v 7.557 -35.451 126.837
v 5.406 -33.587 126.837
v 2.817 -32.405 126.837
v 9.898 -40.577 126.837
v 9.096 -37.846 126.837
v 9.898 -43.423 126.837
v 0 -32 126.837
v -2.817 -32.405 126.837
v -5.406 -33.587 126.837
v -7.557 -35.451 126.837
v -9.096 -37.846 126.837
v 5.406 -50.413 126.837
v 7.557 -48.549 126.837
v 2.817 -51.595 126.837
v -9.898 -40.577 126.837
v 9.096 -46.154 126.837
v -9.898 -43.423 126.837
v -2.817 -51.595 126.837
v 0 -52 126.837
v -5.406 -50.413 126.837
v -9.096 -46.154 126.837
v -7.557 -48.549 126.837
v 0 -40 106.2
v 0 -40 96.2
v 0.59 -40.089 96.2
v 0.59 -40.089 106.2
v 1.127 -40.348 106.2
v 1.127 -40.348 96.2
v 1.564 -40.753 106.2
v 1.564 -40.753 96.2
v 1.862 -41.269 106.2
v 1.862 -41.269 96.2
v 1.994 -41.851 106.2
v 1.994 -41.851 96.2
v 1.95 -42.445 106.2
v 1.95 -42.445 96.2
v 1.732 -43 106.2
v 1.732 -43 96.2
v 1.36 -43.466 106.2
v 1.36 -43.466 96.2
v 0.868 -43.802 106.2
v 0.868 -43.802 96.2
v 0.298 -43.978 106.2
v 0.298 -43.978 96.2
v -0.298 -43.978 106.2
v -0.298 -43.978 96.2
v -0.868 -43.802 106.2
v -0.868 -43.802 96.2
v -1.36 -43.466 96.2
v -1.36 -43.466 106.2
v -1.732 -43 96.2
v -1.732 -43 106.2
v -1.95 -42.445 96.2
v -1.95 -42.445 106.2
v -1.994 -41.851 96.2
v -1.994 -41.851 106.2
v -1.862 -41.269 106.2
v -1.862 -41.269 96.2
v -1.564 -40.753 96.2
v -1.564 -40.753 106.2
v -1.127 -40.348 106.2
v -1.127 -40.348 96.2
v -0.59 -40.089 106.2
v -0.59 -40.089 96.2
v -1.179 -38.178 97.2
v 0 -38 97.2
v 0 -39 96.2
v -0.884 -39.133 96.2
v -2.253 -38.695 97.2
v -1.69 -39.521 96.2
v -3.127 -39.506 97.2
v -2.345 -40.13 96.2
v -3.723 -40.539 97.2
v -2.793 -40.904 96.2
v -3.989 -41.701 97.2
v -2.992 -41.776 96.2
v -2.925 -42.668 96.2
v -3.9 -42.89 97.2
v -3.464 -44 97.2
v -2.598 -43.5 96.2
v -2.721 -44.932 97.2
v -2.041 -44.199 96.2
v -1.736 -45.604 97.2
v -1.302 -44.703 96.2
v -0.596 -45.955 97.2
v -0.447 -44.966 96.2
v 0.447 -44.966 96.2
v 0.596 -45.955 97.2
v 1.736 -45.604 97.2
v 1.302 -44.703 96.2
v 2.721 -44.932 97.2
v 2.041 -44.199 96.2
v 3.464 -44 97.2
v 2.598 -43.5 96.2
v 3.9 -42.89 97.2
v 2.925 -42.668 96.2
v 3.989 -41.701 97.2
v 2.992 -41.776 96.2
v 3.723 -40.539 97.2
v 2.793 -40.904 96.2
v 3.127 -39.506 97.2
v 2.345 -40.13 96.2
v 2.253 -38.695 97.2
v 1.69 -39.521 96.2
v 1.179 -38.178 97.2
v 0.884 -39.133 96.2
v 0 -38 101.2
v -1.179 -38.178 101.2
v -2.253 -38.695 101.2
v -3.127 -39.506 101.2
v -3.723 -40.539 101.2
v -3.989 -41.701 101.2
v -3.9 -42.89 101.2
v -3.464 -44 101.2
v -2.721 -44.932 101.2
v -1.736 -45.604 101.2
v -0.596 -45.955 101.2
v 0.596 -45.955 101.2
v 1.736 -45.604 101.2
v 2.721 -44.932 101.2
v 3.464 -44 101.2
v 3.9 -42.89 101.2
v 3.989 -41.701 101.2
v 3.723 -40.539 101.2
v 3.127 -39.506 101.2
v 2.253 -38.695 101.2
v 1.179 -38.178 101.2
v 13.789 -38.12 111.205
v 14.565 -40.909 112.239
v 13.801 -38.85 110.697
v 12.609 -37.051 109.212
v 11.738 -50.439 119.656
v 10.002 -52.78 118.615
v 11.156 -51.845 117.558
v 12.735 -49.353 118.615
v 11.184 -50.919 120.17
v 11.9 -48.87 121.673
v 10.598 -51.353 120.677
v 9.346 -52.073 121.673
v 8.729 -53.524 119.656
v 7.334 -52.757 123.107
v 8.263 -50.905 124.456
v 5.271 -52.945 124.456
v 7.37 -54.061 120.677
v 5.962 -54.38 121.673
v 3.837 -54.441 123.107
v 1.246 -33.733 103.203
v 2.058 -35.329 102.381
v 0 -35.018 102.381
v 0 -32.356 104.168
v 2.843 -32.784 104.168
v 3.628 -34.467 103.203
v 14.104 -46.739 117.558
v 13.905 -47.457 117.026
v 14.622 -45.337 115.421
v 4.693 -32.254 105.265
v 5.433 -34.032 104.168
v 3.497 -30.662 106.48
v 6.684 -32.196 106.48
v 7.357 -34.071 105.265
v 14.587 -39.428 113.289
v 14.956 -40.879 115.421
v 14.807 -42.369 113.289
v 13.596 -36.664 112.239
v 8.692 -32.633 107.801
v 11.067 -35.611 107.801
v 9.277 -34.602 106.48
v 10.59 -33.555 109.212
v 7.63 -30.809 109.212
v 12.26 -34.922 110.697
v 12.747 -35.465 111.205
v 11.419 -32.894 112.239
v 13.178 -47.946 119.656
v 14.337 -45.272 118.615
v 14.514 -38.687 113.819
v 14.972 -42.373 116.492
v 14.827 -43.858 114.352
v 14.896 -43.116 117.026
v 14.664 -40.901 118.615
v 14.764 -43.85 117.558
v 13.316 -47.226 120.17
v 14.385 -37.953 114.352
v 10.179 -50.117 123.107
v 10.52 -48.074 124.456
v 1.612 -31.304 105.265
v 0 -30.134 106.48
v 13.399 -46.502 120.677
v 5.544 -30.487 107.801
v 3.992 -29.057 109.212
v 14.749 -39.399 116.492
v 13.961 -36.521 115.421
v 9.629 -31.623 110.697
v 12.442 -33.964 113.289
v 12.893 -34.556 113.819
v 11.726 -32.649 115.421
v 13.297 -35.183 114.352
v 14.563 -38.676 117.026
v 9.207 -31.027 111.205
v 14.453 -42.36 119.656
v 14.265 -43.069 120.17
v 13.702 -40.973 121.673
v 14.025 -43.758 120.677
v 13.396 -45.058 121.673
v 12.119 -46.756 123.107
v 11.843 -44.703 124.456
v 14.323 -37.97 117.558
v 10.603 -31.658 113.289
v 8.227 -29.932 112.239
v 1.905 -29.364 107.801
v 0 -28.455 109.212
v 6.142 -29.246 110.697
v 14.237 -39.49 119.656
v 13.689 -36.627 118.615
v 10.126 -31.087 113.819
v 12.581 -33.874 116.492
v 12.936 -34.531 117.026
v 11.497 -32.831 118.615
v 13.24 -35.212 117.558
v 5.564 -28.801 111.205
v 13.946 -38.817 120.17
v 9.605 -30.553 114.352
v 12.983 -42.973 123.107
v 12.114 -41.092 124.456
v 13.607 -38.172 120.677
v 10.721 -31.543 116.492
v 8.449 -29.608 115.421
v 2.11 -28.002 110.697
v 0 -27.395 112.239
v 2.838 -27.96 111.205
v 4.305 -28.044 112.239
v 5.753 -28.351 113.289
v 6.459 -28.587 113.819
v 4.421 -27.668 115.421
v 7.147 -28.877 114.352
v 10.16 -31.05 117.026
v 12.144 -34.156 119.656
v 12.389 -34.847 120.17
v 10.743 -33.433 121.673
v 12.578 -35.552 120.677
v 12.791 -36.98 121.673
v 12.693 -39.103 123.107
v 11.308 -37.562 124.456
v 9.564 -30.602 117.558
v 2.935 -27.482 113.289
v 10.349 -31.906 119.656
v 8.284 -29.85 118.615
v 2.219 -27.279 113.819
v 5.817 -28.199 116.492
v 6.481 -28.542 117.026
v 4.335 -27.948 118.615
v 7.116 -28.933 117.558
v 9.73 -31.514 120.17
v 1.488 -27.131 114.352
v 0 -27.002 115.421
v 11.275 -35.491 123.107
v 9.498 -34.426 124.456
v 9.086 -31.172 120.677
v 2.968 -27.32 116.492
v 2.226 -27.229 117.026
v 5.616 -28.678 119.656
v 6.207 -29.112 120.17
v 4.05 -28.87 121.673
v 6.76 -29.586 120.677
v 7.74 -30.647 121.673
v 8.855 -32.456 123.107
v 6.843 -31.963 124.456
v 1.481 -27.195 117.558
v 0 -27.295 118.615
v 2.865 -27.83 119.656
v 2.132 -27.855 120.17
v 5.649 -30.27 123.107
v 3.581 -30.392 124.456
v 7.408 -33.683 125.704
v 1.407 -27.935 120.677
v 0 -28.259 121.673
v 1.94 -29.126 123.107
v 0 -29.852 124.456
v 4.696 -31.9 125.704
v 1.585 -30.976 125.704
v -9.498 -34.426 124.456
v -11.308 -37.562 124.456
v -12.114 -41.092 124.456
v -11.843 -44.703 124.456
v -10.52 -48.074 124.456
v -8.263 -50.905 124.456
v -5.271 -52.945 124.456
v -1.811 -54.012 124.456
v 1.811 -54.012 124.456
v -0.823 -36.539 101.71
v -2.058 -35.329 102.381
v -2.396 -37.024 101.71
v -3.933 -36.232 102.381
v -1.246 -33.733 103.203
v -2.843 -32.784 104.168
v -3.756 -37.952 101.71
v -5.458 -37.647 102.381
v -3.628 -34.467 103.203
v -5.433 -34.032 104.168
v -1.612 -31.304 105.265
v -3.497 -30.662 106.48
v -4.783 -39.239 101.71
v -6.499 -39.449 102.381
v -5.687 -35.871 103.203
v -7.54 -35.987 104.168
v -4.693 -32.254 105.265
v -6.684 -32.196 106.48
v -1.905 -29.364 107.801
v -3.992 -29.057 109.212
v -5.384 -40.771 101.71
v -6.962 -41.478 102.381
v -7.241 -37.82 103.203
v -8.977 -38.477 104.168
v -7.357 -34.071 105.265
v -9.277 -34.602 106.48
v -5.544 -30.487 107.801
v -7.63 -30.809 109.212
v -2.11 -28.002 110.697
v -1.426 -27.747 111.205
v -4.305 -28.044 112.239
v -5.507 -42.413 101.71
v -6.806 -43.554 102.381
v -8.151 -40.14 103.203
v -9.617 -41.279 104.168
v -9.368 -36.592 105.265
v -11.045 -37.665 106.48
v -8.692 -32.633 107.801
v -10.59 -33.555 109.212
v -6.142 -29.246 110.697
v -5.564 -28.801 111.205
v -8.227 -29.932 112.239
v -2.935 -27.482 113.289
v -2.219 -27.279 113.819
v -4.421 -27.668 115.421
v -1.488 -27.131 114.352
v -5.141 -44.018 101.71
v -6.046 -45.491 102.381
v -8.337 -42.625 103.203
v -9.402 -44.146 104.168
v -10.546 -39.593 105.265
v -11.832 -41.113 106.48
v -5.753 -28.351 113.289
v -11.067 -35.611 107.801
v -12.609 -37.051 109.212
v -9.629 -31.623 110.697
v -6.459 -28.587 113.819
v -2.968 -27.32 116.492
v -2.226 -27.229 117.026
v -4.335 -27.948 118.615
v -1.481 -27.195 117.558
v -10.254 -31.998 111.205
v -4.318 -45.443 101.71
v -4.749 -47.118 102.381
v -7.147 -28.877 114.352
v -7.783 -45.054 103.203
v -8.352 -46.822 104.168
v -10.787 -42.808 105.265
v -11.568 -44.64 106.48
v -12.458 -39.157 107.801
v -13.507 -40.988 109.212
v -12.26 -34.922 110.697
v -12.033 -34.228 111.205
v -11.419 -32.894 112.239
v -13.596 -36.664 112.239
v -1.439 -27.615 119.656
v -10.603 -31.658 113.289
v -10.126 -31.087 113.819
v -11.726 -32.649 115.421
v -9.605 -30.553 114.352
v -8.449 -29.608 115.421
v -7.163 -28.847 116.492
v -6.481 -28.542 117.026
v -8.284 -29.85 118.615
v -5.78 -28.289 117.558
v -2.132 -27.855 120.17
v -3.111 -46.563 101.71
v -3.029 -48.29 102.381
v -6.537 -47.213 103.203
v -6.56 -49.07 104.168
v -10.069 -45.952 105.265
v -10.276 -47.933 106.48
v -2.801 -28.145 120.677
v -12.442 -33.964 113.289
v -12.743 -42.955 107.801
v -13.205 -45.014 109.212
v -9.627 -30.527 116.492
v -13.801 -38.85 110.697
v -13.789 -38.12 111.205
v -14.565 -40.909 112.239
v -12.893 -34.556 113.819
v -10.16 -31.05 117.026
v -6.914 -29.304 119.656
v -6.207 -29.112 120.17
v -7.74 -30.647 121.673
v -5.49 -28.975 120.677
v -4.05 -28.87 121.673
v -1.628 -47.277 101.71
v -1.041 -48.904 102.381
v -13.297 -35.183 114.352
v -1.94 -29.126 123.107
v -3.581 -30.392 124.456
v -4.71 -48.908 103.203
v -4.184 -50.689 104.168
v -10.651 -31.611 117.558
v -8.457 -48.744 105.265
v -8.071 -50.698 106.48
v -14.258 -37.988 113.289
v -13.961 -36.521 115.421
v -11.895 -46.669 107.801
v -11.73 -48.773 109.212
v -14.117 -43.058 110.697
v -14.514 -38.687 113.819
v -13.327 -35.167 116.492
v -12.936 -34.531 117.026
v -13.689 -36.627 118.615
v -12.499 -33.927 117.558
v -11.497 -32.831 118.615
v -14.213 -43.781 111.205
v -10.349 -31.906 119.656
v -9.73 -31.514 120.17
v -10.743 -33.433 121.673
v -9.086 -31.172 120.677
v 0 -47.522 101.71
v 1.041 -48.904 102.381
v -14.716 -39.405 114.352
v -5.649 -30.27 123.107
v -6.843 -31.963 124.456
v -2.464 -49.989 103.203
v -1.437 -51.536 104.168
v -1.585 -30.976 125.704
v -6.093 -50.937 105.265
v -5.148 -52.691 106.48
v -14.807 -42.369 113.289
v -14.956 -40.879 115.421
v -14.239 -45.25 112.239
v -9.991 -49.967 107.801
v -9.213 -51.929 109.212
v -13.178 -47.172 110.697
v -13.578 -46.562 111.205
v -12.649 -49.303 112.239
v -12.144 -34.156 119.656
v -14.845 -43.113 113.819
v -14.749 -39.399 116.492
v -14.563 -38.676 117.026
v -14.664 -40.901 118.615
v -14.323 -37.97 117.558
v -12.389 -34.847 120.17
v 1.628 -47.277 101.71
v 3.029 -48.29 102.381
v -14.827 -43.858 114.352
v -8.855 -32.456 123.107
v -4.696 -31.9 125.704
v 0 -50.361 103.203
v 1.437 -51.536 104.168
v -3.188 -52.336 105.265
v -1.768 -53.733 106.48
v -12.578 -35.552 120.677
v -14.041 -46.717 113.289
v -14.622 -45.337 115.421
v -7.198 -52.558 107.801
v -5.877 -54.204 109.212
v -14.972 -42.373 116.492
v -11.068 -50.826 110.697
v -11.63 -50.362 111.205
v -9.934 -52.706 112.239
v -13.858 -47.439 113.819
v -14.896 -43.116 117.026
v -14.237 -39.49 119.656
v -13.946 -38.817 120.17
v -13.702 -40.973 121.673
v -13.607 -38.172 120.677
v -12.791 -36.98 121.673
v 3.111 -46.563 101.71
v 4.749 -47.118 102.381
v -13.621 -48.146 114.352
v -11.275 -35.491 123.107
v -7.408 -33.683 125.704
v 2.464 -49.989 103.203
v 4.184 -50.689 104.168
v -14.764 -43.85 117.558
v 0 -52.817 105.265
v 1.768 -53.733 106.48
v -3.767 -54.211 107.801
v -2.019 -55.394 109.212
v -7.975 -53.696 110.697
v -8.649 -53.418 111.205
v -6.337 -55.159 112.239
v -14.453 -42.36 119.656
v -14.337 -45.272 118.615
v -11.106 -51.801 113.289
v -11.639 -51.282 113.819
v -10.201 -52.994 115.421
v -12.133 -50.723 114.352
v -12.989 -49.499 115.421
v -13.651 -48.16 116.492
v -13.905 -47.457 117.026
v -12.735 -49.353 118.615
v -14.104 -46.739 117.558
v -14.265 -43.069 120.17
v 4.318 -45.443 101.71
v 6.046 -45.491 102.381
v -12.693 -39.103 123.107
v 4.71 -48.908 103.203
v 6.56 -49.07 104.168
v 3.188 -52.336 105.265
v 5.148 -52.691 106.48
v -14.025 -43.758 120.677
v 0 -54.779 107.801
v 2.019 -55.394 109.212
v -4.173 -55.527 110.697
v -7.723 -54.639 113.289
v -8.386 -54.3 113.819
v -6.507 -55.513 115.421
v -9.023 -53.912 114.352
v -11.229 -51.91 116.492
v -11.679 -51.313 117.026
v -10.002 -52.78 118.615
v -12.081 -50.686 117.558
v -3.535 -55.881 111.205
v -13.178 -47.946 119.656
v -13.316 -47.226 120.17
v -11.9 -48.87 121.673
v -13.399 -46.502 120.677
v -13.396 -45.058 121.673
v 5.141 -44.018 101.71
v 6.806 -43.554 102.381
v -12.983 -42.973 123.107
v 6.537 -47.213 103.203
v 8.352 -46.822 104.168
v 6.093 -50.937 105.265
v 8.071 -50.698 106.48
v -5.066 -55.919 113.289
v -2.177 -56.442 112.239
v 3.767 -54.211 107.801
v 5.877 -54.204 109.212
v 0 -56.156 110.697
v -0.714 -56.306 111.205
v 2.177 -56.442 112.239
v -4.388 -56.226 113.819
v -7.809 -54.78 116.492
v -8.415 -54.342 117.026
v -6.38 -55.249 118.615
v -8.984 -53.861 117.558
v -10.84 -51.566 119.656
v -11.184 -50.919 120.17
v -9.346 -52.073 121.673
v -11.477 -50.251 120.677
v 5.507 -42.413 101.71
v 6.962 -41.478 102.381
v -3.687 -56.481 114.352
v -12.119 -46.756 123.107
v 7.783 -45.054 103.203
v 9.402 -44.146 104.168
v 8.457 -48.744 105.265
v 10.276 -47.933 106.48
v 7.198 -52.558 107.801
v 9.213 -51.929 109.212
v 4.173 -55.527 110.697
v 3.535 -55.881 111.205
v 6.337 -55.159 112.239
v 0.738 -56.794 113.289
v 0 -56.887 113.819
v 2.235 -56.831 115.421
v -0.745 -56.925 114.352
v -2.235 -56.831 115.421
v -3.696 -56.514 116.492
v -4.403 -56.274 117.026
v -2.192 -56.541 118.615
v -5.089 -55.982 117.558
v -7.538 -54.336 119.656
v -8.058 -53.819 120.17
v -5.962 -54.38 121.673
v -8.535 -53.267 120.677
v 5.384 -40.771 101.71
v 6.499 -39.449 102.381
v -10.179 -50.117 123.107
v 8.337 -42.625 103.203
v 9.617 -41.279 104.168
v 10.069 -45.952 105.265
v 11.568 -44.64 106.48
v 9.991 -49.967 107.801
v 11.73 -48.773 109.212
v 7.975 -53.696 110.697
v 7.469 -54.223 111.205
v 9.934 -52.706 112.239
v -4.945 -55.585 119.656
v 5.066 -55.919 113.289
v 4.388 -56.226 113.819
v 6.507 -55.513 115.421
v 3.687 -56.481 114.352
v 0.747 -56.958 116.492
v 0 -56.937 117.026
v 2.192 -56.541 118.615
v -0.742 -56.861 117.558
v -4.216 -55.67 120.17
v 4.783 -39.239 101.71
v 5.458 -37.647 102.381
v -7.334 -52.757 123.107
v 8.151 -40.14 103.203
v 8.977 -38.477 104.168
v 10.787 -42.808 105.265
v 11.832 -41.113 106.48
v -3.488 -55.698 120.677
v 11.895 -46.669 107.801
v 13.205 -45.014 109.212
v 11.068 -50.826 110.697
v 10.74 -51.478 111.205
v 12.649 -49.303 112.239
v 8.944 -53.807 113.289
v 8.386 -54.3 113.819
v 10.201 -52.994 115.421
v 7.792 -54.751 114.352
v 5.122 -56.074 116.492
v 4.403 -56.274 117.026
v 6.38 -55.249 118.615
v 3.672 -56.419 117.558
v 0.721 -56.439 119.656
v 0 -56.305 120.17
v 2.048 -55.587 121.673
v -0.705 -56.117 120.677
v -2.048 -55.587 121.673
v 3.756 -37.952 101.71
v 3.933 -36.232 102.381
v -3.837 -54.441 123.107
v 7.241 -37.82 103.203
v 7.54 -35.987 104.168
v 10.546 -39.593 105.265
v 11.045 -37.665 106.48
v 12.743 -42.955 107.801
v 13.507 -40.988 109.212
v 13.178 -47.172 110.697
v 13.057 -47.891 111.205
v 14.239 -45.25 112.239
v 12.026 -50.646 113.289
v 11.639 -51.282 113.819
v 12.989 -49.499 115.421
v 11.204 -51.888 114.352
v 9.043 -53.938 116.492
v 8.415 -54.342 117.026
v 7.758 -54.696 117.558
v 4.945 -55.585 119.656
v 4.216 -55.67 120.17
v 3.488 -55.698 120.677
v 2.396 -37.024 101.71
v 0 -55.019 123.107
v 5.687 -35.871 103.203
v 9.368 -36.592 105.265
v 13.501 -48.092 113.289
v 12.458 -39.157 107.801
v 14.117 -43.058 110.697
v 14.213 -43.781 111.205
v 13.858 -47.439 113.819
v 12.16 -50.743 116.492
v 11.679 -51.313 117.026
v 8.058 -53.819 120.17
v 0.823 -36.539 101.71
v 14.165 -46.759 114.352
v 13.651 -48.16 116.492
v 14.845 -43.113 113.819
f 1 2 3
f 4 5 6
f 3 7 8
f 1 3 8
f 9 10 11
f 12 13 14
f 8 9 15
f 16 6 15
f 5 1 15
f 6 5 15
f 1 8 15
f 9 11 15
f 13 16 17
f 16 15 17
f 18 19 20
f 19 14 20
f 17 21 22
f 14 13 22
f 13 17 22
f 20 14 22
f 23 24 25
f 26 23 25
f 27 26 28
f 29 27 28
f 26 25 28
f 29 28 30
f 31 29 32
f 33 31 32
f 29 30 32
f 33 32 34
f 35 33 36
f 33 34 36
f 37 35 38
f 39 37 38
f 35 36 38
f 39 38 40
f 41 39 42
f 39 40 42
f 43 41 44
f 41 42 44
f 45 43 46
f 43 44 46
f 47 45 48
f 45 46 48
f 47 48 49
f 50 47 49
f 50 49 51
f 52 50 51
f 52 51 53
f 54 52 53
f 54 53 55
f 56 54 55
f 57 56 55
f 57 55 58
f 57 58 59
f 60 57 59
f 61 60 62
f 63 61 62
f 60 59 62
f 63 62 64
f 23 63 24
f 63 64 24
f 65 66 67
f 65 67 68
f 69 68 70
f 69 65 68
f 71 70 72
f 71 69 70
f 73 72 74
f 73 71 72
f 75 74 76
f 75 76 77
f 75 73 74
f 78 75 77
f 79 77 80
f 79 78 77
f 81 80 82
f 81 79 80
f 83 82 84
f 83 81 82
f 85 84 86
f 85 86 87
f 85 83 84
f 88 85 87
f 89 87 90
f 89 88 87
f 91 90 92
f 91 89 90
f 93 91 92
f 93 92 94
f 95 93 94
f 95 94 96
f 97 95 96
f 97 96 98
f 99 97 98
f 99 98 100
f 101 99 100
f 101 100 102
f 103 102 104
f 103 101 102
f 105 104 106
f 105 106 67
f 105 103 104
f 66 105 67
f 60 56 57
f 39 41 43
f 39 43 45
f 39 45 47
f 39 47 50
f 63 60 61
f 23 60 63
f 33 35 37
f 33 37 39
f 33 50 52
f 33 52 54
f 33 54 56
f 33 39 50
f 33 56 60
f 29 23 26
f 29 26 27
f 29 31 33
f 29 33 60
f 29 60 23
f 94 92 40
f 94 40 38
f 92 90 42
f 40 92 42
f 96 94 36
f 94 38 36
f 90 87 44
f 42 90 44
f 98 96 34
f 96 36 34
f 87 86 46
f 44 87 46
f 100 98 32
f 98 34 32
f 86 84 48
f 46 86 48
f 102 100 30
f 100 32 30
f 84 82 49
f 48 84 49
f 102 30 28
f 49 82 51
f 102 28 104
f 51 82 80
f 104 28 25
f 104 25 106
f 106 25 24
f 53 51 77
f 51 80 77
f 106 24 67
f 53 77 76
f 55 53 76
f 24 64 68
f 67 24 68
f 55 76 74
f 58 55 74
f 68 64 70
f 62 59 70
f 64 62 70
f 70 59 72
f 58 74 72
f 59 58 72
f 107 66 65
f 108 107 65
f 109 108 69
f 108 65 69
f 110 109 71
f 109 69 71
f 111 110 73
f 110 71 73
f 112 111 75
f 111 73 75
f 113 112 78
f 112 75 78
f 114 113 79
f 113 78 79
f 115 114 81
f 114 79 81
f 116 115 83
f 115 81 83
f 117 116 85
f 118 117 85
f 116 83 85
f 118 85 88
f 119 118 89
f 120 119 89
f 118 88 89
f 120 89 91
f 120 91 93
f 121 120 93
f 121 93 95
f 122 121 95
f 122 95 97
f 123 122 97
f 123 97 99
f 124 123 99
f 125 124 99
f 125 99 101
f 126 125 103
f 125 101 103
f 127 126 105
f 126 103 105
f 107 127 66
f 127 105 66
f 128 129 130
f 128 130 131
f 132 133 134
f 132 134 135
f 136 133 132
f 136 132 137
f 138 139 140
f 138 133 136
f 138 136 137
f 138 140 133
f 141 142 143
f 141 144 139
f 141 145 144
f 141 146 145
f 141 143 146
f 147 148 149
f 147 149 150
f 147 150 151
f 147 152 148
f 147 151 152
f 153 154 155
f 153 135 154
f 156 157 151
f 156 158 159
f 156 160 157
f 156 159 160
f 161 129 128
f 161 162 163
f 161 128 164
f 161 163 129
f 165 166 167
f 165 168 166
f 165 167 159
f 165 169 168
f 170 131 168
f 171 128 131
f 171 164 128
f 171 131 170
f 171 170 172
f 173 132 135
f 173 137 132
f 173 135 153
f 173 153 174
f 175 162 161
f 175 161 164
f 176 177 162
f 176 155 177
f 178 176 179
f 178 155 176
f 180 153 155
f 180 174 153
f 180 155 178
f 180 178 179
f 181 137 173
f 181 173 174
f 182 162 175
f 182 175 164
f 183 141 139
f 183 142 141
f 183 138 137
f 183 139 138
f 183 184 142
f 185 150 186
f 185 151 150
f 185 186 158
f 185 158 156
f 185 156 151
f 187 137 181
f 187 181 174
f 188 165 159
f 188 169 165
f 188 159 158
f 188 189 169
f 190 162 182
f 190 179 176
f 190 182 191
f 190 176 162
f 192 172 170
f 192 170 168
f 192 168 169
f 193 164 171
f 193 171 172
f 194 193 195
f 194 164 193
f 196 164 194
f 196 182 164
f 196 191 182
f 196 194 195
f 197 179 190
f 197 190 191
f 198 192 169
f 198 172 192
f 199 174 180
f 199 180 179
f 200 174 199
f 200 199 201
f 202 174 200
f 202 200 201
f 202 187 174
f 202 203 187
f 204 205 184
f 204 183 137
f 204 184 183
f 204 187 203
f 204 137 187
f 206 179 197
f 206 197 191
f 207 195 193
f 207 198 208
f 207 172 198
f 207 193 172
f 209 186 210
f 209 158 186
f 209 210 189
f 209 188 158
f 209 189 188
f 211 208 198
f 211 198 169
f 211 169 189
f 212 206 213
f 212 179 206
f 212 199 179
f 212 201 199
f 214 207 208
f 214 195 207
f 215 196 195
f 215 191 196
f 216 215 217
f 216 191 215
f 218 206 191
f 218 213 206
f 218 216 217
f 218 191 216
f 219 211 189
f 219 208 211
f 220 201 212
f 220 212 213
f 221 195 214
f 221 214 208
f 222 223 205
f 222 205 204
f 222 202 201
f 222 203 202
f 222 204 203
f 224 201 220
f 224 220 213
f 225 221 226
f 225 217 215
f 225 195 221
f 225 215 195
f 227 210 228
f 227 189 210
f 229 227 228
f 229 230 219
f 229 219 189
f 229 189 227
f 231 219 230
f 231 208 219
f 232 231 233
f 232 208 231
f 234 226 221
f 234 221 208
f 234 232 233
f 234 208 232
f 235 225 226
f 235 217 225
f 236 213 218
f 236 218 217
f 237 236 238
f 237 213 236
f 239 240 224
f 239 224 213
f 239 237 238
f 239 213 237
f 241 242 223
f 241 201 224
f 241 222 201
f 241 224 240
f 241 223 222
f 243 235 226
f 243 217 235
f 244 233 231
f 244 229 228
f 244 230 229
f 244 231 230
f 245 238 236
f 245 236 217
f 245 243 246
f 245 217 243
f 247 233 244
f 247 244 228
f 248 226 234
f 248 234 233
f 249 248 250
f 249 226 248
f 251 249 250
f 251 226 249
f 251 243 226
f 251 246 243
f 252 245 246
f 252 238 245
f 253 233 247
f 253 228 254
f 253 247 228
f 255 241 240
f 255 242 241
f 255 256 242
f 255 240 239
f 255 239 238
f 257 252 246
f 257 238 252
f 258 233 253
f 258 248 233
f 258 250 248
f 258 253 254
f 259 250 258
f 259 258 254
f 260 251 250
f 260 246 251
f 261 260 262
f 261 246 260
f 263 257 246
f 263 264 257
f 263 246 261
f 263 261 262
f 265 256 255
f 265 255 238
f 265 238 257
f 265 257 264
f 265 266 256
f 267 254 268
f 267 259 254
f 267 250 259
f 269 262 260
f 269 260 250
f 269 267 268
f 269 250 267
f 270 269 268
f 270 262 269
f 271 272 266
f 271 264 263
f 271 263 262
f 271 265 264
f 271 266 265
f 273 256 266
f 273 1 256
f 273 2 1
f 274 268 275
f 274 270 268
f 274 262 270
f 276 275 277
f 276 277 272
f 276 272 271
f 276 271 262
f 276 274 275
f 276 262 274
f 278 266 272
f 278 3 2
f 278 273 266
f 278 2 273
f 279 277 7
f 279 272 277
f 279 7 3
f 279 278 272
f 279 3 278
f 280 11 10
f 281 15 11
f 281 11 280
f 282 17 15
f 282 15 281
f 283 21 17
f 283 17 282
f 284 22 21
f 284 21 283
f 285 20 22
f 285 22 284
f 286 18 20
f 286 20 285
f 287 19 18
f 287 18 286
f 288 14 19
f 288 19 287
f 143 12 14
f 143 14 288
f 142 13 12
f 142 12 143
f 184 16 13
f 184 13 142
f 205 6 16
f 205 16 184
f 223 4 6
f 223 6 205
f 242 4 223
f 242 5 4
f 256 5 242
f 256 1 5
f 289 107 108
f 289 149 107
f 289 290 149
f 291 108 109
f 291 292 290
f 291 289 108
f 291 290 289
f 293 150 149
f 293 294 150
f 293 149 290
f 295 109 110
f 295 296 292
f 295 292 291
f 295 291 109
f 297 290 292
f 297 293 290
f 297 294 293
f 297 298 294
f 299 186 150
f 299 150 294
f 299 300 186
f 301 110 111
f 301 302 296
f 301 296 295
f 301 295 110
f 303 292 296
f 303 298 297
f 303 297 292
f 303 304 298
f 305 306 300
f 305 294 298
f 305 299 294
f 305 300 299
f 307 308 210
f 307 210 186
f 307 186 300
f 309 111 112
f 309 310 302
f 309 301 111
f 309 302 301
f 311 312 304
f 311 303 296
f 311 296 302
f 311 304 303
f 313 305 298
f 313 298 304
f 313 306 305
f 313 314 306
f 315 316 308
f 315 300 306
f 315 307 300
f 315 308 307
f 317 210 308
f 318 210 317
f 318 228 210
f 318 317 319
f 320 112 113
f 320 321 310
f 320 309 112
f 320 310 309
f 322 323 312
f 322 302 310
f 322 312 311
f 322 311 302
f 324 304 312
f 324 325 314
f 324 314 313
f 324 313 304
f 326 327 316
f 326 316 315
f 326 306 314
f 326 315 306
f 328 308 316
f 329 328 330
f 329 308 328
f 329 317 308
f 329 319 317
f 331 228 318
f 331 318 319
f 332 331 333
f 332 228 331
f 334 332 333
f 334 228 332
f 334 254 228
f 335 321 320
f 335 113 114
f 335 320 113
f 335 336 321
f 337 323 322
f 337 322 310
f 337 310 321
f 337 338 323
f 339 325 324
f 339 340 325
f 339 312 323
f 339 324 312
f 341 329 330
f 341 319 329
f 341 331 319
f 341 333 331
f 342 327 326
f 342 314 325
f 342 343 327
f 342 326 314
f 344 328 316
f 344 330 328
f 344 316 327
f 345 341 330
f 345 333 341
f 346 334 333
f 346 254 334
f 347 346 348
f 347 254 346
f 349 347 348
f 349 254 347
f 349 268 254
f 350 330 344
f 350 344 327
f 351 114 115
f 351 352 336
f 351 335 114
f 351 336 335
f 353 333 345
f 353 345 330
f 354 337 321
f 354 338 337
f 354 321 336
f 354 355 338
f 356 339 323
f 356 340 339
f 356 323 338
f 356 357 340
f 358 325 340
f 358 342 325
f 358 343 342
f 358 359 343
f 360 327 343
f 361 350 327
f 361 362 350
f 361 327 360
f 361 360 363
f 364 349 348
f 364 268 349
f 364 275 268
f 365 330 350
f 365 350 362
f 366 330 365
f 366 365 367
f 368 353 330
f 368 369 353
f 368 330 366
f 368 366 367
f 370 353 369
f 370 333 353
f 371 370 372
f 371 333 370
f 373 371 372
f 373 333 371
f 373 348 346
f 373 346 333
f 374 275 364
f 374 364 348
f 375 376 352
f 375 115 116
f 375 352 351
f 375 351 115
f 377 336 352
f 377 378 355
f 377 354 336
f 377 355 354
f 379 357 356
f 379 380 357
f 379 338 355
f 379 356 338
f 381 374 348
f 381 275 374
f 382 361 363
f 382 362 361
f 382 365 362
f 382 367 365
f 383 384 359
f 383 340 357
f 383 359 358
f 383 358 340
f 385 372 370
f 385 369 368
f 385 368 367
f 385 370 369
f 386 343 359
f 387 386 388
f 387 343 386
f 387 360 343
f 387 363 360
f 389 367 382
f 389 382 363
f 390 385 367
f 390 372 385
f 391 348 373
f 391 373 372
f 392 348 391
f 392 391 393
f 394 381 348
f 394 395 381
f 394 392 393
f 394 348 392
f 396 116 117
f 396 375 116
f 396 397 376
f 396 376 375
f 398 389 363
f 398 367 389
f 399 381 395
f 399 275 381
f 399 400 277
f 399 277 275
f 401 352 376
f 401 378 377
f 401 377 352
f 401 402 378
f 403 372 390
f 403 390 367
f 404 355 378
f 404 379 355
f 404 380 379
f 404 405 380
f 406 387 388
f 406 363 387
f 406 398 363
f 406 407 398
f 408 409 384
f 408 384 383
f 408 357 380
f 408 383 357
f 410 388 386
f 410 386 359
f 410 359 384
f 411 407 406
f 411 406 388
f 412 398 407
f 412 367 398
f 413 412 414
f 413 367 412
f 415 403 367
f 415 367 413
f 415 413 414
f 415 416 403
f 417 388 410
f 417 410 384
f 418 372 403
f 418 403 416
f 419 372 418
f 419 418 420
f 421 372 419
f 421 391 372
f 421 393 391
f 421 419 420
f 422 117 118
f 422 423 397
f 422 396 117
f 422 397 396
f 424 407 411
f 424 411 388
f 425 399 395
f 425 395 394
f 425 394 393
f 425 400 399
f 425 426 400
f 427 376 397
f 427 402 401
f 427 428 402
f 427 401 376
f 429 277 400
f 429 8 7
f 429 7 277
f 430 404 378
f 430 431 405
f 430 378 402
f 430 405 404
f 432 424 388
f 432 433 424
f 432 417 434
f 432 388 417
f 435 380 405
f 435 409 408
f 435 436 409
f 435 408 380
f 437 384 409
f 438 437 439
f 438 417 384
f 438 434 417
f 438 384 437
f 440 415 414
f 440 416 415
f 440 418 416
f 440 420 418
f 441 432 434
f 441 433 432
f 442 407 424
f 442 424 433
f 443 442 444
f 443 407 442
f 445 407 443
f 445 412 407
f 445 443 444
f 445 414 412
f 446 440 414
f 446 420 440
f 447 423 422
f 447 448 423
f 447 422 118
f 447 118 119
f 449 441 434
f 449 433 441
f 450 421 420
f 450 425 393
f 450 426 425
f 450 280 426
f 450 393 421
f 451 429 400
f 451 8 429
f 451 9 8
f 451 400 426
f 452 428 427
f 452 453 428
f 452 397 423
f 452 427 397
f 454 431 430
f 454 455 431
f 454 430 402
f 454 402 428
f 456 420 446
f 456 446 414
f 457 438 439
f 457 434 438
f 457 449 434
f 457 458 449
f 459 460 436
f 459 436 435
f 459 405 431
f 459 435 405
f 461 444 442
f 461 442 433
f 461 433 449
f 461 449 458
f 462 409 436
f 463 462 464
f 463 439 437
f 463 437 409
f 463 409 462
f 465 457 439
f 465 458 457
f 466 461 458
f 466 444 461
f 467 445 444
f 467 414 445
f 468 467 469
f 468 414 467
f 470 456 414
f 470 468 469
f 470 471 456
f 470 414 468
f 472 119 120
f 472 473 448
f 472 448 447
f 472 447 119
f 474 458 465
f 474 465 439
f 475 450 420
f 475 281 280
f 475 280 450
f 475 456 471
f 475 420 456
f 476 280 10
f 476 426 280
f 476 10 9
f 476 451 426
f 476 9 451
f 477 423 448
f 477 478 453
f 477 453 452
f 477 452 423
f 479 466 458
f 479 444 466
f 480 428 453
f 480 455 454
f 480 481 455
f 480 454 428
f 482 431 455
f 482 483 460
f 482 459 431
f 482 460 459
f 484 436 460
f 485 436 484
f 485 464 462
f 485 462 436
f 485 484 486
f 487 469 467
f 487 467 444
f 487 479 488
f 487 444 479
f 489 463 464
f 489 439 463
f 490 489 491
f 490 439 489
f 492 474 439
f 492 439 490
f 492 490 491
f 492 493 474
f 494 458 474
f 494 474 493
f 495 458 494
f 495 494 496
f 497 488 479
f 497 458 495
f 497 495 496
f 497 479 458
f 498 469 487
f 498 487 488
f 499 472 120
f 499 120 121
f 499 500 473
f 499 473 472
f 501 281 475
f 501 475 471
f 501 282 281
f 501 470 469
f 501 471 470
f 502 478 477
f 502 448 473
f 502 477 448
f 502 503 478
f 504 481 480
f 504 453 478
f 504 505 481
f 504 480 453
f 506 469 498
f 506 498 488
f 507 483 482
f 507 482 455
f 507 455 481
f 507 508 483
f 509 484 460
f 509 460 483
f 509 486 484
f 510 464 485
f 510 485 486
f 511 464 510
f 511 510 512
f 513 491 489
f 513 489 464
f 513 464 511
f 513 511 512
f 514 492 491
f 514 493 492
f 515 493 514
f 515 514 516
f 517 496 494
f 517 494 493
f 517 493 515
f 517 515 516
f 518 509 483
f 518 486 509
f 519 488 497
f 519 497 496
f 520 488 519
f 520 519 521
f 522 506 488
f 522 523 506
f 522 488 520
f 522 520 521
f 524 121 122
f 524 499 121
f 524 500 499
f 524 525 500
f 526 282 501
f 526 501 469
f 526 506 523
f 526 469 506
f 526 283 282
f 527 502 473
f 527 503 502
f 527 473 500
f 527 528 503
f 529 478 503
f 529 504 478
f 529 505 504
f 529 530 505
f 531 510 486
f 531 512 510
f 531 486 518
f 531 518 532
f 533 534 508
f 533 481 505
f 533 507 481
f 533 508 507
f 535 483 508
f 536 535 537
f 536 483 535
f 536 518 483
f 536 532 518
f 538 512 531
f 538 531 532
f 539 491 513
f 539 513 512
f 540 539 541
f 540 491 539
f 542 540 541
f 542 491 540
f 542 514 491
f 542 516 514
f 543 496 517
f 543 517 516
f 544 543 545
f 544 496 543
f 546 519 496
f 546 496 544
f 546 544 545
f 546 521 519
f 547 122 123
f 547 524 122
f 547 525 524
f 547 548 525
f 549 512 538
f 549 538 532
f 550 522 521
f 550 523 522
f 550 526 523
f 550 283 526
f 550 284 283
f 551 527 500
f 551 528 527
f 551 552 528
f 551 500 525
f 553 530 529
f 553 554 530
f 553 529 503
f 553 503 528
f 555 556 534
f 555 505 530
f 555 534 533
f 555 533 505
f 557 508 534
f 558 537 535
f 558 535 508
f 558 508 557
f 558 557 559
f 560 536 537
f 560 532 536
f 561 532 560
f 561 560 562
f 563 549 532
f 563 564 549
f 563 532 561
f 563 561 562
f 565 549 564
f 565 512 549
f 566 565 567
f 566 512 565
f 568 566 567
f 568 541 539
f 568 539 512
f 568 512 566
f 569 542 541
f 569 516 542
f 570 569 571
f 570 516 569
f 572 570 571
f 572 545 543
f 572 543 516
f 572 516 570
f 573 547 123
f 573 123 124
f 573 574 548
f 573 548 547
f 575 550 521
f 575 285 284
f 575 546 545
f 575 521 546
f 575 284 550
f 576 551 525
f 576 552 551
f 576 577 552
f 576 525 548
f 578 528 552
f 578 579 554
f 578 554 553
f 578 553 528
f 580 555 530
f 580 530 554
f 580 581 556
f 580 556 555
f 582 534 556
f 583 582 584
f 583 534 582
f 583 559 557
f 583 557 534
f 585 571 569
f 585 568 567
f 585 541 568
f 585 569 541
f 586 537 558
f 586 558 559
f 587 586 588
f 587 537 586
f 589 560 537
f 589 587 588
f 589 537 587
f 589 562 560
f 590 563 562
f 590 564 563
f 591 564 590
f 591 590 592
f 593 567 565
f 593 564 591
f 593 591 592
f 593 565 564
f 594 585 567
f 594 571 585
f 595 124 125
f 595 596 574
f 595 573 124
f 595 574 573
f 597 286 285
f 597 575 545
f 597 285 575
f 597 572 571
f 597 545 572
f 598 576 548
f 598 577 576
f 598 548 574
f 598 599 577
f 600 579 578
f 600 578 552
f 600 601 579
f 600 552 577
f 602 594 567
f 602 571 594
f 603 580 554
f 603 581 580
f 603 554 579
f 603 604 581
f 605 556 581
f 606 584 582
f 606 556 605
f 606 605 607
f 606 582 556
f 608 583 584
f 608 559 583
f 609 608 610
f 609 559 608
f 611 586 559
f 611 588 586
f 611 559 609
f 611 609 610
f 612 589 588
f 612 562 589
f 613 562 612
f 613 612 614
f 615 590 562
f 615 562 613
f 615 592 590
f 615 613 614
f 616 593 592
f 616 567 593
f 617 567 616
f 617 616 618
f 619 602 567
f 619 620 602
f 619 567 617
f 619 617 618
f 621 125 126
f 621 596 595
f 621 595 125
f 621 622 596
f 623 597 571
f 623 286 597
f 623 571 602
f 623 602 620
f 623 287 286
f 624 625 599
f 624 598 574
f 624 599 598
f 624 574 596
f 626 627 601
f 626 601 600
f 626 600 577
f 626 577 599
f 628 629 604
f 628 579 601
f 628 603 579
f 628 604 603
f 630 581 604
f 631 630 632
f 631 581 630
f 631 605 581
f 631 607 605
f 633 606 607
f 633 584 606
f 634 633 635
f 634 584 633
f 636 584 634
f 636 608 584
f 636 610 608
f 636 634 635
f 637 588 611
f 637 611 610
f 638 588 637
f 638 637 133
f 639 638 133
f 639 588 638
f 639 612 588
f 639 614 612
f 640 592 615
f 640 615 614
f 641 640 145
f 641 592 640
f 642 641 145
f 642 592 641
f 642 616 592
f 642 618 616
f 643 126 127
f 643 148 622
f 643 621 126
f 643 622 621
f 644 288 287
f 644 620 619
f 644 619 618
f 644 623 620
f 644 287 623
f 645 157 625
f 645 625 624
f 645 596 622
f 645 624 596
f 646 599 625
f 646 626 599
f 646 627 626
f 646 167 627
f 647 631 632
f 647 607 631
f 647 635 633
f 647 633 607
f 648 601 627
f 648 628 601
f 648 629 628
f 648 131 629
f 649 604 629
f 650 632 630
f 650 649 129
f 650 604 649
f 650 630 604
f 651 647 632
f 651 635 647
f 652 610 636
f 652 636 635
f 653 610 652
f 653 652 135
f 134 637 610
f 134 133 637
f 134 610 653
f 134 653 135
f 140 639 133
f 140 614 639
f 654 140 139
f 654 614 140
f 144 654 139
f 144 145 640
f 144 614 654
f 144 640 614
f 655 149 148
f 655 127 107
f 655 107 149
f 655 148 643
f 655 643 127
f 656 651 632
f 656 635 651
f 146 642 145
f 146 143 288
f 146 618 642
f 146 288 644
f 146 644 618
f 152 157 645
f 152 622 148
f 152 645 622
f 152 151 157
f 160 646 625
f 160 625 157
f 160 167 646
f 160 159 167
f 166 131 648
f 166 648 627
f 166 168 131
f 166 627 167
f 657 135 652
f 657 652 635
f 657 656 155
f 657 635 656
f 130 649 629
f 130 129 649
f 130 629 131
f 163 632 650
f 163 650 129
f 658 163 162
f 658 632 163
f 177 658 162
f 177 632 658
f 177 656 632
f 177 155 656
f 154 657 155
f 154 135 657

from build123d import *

# Parameters (mm, degrees)
CHAMFER_SIZE    = 1
SKETCH010_R     = 2
POCKET001_DEPTH = 10


with BuildPart() as part:
    # Sketch009 → Revolution001 (revolve)
    with BuildSketch(Plane(origin=(0, -42, 96), x_dir=(0, 1, 0), z_dir=(1, 0, 0))):
        with BuildLine():
            ThreePointArc((4, 5.2), (14.605347, 16.238667), (10, 30.837172))
            Line((0, 30.837172), (10, 30.837172))
            Line((0, 0.2), (0, 30.837172))
            Line((4, 0.2), (0, 0.2))
            Line((4, 5.2), (4, 0.2))
        make_face()
    revolve(axis=Axis((0, -42, 96), (0, 0, 1)))

    # Chamfer
    chamfer_edges = [part.edges().sort_by_distance(p)[0] for p in [
        (0, -46, 96.2),
    ]]
    chamfer(chamfer_edges, length=CHAMFER_SIZE)

    # Sketch010 → Pocket001 (cut)
    with BuildSketch(Plane(origin=(0, -42, 96.2), x_dir=(0, 1, 0), z_dir=(0, 0, -1))):
        Circle(SKETCH010_R)
    extrude(amount=-POCKET001_DEPTH, mode=Mode.SUBTRACT)


solid = part.part
